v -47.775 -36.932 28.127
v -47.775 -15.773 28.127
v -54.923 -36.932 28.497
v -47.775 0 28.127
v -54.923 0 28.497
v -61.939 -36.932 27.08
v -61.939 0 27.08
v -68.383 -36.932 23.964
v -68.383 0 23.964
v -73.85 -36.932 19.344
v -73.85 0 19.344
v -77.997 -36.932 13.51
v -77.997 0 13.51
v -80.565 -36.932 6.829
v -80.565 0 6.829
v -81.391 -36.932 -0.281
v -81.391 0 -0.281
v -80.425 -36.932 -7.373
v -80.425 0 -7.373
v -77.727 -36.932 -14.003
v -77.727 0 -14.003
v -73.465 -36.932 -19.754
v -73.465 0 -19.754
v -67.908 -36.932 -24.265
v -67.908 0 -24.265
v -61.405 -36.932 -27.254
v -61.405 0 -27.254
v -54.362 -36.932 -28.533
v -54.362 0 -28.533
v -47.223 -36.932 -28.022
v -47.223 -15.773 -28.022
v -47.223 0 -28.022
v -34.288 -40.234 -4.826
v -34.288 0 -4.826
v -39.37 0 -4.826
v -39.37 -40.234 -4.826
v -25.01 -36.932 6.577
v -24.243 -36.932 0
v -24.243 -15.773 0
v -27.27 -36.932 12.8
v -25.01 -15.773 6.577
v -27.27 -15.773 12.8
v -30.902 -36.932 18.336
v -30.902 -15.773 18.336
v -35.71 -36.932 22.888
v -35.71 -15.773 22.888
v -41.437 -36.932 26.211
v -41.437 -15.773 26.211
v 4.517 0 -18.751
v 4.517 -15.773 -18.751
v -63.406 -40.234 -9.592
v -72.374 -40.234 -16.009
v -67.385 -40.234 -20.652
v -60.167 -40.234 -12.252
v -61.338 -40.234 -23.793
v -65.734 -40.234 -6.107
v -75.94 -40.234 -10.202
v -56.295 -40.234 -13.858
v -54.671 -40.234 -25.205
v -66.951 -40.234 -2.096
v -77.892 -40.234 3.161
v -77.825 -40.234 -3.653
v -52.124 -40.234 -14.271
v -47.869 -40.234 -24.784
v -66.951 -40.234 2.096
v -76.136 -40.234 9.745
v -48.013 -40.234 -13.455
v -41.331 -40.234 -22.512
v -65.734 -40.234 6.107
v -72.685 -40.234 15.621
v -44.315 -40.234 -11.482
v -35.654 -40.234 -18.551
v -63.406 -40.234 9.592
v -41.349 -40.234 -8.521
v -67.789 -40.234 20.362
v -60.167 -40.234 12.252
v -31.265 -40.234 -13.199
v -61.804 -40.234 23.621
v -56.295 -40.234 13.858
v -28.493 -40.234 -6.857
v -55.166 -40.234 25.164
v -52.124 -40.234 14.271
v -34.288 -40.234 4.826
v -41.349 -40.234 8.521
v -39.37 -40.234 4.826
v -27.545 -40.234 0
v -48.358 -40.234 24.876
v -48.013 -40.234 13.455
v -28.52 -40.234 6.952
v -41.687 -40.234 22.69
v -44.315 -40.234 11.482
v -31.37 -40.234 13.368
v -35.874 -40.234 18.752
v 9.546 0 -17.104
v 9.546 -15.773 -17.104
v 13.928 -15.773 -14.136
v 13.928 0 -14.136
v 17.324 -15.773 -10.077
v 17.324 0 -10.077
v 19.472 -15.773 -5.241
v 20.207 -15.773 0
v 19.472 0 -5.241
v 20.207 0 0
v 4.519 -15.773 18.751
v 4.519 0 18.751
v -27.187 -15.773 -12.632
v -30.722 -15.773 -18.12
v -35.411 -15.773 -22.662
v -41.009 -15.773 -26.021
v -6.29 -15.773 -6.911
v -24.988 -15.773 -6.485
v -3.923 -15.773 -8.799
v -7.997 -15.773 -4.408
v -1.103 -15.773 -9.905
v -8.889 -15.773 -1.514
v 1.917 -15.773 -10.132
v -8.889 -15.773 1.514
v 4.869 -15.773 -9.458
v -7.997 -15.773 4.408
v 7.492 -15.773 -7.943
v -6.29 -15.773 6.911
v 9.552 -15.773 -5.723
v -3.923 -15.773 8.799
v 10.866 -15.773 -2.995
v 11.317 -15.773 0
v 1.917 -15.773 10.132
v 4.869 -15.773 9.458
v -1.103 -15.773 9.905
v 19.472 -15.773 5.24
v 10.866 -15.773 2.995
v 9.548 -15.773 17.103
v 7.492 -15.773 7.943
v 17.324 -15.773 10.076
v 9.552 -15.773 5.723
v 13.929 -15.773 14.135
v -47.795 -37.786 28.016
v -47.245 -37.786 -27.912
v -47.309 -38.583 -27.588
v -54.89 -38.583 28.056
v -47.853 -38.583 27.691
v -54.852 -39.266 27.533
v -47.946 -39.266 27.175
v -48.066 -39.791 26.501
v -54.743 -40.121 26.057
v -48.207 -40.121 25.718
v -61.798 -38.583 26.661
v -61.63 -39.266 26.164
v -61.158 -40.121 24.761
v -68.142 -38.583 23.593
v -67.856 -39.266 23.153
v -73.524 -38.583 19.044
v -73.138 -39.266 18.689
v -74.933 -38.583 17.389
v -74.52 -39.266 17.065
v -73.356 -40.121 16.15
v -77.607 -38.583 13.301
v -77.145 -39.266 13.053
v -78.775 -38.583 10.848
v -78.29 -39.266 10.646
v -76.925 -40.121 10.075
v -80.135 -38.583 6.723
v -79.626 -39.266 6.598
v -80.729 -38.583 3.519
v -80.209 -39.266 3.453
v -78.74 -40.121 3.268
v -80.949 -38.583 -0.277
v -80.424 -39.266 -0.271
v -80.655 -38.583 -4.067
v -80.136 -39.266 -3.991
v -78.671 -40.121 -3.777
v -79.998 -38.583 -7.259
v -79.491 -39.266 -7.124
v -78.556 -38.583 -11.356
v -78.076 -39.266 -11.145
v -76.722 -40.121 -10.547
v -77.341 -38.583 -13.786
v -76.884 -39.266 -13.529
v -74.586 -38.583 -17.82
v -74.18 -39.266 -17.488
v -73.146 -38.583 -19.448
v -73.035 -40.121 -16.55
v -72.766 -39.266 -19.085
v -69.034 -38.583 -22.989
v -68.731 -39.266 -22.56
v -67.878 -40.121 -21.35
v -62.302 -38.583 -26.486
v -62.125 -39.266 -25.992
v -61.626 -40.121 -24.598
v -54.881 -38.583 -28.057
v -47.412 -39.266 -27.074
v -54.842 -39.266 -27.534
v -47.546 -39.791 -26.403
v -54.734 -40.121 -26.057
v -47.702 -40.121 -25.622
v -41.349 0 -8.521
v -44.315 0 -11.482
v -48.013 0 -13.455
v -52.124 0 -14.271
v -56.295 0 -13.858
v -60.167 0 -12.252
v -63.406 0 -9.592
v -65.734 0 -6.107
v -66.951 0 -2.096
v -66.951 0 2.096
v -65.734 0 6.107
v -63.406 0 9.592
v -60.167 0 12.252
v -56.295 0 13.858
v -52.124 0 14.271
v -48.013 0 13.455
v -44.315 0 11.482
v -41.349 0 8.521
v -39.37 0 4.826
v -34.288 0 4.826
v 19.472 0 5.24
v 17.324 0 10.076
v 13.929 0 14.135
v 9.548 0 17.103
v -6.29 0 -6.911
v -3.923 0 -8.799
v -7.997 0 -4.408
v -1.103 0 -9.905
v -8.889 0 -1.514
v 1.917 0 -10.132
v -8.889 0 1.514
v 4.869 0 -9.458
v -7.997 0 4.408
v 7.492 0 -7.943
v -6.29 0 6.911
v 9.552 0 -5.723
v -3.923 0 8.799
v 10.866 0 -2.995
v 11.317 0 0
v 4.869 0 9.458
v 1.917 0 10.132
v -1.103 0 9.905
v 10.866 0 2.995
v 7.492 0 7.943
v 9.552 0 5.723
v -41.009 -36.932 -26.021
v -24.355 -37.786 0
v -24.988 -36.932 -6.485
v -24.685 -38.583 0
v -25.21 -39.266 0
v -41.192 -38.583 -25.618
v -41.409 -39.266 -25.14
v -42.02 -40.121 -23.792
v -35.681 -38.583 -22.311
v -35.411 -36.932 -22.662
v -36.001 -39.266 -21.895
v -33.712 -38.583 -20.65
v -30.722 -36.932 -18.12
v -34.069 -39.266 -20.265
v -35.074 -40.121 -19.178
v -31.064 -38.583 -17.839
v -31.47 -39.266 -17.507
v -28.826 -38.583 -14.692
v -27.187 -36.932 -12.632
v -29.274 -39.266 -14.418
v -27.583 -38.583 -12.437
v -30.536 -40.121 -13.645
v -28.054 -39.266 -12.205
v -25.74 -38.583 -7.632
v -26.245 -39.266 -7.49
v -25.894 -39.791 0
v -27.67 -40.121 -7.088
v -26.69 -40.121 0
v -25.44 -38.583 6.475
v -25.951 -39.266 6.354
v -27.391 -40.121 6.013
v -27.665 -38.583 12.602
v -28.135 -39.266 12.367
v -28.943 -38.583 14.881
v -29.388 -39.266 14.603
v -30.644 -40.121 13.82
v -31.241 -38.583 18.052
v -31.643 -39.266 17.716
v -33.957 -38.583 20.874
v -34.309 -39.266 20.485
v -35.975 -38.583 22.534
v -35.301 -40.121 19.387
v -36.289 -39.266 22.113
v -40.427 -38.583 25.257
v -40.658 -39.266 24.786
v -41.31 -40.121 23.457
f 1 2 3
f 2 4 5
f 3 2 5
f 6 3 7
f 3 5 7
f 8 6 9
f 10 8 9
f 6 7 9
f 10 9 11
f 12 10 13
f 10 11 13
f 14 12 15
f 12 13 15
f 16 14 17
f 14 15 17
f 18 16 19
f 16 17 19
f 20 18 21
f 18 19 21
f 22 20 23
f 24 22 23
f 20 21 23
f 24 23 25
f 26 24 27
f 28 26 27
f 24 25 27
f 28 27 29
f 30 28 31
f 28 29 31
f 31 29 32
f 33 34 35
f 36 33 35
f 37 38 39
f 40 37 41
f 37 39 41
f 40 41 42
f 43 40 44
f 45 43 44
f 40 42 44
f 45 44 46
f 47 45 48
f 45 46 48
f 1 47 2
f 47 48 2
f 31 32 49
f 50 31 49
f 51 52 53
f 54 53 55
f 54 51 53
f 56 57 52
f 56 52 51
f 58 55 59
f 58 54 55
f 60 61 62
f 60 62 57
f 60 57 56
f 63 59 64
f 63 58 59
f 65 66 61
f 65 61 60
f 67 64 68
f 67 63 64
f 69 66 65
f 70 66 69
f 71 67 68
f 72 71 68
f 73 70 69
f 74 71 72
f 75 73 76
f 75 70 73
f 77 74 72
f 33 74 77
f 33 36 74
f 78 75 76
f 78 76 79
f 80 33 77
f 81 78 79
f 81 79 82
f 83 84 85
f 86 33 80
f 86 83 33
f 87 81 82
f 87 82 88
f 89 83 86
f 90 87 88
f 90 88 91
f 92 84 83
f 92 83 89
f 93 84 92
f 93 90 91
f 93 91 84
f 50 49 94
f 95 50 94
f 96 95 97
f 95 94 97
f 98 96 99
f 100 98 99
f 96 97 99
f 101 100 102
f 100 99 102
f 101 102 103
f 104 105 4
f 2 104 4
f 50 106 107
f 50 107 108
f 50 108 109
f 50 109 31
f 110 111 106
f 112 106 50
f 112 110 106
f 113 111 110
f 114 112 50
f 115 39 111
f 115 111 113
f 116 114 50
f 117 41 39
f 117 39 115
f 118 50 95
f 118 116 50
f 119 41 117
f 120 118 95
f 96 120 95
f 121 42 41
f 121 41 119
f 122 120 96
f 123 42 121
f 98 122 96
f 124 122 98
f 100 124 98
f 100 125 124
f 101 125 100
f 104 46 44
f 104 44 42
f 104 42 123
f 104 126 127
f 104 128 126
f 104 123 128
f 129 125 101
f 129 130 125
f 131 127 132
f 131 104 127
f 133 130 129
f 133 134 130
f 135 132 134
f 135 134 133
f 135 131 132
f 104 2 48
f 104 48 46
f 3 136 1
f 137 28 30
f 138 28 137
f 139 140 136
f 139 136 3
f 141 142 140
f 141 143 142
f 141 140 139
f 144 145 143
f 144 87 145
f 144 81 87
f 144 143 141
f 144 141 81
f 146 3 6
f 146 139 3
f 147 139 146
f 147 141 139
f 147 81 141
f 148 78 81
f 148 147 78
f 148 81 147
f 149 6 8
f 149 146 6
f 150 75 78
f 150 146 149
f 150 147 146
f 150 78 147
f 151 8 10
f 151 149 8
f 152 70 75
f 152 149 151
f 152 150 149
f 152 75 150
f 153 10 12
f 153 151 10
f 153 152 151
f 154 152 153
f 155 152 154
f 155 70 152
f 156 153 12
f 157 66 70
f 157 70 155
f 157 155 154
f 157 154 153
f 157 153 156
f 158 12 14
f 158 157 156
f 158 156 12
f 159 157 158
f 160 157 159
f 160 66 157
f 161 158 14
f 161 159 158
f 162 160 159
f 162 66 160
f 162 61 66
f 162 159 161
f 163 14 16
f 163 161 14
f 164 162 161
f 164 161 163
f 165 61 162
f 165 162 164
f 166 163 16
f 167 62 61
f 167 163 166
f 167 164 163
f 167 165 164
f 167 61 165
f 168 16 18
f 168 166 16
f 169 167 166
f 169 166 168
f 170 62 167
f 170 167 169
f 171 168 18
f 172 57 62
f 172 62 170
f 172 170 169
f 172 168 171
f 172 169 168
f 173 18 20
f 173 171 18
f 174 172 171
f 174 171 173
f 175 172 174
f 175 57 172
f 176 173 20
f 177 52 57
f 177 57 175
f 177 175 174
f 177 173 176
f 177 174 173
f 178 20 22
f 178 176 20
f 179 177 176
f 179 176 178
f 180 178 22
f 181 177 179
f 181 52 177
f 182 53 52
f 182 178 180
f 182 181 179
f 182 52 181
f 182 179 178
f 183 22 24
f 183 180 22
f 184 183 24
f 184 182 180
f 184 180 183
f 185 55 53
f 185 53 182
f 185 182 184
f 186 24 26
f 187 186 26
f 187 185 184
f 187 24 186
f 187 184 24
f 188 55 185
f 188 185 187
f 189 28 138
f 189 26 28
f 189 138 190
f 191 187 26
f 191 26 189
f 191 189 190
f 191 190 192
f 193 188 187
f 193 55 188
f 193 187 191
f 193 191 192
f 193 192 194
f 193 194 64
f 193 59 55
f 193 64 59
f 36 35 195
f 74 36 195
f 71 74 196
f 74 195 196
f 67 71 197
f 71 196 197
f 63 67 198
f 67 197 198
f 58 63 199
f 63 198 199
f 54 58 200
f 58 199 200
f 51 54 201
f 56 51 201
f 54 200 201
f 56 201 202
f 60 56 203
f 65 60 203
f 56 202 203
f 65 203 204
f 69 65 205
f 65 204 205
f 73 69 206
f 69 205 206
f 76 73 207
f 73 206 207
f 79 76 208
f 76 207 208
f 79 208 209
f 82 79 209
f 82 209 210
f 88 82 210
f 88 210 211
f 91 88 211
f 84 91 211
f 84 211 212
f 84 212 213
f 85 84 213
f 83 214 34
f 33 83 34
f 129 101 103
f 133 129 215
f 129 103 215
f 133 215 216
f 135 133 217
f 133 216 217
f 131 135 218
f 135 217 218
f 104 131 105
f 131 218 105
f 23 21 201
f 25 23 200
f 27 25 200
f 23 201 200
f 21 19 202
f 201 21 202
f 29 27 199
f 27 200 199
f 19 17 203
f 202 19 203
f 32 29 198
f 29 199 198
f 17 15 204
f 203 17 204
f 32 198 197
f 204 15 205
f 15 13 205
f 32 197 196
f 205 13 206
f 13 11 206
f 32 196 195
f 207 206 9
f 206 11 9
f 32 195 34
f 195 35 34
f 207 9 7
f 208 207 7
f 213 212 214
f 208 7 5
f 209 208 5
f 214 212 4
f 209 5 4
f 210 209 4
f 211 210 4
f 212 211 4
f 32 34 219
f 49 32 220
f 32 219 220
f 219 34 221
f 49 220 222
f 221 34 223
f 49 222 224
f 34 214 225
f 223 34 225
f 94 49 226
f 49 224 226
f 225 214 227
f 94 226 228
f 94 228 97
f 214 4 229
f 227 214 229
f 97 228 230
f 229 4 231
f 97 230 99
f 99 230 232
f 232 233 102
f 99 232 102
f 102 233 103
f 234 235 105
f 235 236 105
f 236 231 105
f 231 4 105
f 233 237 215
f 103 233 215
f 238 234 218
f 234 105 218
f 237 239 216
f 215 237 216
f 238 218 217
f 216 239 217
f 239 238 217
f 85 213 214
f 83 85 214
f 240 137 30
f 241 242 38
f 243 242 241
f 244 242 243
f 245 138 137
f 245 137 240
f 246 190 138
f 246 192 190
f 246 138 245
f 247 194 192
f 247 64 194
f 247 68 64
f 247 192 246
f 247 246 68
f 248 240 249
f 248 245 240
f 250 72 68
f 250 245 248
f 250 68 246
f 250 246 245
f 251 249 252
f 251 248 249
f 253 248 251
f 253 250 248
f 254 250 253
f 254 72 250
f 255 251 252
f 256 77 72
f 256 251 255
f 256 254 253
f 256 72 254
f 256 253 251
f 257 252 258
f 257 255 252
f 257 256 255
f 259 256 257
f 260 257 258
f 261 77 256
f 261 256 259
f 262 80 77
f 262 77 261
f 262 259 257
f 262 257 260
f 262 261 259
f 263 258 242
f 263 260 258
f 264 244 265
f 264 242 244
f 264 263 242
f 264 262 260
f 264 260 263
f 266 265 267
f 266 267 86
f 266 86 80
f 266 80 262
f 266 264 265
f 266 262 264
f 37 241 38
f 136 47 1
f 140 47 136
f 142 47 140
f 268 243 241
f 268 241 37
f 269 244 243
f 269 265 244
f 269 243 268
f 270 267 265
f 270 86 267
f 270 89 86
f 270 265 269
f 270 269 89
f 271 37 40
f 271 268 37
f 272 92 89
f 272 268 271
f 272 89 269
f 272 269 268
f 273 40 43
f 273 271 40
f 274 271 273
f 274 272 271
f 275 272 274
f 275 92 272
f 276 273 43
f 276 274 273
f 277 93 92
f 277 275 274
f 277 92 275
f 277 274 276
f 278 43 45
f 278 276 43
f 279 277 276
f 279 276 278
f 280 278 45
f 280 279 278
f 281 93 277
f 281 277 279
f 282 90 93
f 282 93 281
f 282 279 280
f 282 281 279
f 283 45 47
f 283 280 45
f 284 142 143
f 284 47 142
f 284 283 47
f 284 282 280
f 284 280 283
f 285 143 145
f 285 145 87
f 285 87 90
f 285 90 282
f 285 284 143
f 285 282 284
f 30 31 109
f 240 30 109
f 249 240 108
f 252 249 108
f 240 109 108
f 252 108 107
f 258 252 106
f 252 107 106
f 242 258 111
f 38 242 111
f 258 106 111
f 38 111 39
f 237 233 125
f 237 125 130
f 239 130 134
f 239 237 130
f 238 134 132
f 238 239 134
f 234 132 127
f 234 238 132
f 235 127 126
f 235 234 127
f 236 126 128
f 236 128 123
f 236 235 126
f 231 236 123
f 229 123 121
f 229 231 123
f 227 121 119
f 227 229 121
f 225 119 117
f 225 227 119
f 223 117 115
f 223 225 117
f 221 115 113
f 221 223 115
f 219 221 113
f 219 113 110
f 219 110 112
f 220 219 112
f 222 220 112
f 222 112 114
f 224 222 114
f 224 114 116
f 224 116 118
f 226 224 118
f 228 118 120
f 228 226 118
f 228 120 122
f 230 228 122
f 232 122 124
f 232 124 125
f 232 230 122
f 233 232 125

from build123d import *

# Parameters (mm, degrees)
F1_DEPTH = 40.2336
F0_R     = 10.16
F2_DEPTH = 15.7734
F3_R     = 3.302


with BuildPart() as f1:
    # F0 (on Front) → F1 (new body)
    with BuildSketch(Plane.XZ):
        with BuildLine():
            ThreePointArc((-47.222857, -28.021934), (-30.722388, -18.119866), (-24.242661, 0))
            ThreePointArc((-24.242661, 0), (-30.901637, 18.336262), (-47.775014, 28.126541))
            ThreePointArc((-47.775014, 28.126541), (-81.39128, -0.28099), (-47.222857, -28.021934))
        make_face()
        with BuildLine():
            ThreePointArc((-39.369896, -4.826), (-67.105161, 0), (-39.369896, 4.826))
            Line((-39.369896, 4.826), (-34.288361, 4.826))
            Line((-34.288361, 4.826), (-34.288361, 0))
            Line((-34.288361, 0), (-34.288361, -4.826))
            Line((-34.288361, -4.826), (-39.369896, -4.826))
        make_face(mode=Mode.SUBTRACT)
    extrude(amount=F1_DEPTH)

    # F0 (on Front) → F2 (join)
    with BuildSketch(Plane.XZ):
        with BuildLine():
            ThreePointArc((-47.775014, 28.126541), (-30.901637, 18.336262), (-24.242661, 0))
            ThreePointArc((-24.242661, 0), (-30.722388, -18.119866), (-47.222857, -28.021934))
            Line((-47.222857, -28.021934), (4.517132, -18.751381))
            ThreePointArc((4.517132, -18.751381), (-17.892661, 0.001001), (4.519103, 18.751028))
            Line((4.519103, 18.751028), (-47.775014, 28.126541))
        make_face()
        with BuildLine():
            ThreePointArc((20.207339, 0), (15.768022, 12.224174), (4.519103, 18.751028))
            ThreePointArc((4.519103, 18.751028), (-17.892661, 0.001001), (4.517132, -18.751381))
            ThreePointArc((4.517132, -18.751381), (15.767379, -12.224942), (20.207339, 0))
        make_face()
        with Locations((1.157339, 0)):
            Circle(F0_R, mode=Mode.SUBTRACT)
    extrude(amount=F2_DEPTH)

    # F3
    f3_edges = [f1.edges().sort_by_distance(p)[0] for p in [
        (-58.412466, -40.2336, 28.021934),
    ]]
    fillet(f3_edges, radius=F3_R)


solid = f1.part
